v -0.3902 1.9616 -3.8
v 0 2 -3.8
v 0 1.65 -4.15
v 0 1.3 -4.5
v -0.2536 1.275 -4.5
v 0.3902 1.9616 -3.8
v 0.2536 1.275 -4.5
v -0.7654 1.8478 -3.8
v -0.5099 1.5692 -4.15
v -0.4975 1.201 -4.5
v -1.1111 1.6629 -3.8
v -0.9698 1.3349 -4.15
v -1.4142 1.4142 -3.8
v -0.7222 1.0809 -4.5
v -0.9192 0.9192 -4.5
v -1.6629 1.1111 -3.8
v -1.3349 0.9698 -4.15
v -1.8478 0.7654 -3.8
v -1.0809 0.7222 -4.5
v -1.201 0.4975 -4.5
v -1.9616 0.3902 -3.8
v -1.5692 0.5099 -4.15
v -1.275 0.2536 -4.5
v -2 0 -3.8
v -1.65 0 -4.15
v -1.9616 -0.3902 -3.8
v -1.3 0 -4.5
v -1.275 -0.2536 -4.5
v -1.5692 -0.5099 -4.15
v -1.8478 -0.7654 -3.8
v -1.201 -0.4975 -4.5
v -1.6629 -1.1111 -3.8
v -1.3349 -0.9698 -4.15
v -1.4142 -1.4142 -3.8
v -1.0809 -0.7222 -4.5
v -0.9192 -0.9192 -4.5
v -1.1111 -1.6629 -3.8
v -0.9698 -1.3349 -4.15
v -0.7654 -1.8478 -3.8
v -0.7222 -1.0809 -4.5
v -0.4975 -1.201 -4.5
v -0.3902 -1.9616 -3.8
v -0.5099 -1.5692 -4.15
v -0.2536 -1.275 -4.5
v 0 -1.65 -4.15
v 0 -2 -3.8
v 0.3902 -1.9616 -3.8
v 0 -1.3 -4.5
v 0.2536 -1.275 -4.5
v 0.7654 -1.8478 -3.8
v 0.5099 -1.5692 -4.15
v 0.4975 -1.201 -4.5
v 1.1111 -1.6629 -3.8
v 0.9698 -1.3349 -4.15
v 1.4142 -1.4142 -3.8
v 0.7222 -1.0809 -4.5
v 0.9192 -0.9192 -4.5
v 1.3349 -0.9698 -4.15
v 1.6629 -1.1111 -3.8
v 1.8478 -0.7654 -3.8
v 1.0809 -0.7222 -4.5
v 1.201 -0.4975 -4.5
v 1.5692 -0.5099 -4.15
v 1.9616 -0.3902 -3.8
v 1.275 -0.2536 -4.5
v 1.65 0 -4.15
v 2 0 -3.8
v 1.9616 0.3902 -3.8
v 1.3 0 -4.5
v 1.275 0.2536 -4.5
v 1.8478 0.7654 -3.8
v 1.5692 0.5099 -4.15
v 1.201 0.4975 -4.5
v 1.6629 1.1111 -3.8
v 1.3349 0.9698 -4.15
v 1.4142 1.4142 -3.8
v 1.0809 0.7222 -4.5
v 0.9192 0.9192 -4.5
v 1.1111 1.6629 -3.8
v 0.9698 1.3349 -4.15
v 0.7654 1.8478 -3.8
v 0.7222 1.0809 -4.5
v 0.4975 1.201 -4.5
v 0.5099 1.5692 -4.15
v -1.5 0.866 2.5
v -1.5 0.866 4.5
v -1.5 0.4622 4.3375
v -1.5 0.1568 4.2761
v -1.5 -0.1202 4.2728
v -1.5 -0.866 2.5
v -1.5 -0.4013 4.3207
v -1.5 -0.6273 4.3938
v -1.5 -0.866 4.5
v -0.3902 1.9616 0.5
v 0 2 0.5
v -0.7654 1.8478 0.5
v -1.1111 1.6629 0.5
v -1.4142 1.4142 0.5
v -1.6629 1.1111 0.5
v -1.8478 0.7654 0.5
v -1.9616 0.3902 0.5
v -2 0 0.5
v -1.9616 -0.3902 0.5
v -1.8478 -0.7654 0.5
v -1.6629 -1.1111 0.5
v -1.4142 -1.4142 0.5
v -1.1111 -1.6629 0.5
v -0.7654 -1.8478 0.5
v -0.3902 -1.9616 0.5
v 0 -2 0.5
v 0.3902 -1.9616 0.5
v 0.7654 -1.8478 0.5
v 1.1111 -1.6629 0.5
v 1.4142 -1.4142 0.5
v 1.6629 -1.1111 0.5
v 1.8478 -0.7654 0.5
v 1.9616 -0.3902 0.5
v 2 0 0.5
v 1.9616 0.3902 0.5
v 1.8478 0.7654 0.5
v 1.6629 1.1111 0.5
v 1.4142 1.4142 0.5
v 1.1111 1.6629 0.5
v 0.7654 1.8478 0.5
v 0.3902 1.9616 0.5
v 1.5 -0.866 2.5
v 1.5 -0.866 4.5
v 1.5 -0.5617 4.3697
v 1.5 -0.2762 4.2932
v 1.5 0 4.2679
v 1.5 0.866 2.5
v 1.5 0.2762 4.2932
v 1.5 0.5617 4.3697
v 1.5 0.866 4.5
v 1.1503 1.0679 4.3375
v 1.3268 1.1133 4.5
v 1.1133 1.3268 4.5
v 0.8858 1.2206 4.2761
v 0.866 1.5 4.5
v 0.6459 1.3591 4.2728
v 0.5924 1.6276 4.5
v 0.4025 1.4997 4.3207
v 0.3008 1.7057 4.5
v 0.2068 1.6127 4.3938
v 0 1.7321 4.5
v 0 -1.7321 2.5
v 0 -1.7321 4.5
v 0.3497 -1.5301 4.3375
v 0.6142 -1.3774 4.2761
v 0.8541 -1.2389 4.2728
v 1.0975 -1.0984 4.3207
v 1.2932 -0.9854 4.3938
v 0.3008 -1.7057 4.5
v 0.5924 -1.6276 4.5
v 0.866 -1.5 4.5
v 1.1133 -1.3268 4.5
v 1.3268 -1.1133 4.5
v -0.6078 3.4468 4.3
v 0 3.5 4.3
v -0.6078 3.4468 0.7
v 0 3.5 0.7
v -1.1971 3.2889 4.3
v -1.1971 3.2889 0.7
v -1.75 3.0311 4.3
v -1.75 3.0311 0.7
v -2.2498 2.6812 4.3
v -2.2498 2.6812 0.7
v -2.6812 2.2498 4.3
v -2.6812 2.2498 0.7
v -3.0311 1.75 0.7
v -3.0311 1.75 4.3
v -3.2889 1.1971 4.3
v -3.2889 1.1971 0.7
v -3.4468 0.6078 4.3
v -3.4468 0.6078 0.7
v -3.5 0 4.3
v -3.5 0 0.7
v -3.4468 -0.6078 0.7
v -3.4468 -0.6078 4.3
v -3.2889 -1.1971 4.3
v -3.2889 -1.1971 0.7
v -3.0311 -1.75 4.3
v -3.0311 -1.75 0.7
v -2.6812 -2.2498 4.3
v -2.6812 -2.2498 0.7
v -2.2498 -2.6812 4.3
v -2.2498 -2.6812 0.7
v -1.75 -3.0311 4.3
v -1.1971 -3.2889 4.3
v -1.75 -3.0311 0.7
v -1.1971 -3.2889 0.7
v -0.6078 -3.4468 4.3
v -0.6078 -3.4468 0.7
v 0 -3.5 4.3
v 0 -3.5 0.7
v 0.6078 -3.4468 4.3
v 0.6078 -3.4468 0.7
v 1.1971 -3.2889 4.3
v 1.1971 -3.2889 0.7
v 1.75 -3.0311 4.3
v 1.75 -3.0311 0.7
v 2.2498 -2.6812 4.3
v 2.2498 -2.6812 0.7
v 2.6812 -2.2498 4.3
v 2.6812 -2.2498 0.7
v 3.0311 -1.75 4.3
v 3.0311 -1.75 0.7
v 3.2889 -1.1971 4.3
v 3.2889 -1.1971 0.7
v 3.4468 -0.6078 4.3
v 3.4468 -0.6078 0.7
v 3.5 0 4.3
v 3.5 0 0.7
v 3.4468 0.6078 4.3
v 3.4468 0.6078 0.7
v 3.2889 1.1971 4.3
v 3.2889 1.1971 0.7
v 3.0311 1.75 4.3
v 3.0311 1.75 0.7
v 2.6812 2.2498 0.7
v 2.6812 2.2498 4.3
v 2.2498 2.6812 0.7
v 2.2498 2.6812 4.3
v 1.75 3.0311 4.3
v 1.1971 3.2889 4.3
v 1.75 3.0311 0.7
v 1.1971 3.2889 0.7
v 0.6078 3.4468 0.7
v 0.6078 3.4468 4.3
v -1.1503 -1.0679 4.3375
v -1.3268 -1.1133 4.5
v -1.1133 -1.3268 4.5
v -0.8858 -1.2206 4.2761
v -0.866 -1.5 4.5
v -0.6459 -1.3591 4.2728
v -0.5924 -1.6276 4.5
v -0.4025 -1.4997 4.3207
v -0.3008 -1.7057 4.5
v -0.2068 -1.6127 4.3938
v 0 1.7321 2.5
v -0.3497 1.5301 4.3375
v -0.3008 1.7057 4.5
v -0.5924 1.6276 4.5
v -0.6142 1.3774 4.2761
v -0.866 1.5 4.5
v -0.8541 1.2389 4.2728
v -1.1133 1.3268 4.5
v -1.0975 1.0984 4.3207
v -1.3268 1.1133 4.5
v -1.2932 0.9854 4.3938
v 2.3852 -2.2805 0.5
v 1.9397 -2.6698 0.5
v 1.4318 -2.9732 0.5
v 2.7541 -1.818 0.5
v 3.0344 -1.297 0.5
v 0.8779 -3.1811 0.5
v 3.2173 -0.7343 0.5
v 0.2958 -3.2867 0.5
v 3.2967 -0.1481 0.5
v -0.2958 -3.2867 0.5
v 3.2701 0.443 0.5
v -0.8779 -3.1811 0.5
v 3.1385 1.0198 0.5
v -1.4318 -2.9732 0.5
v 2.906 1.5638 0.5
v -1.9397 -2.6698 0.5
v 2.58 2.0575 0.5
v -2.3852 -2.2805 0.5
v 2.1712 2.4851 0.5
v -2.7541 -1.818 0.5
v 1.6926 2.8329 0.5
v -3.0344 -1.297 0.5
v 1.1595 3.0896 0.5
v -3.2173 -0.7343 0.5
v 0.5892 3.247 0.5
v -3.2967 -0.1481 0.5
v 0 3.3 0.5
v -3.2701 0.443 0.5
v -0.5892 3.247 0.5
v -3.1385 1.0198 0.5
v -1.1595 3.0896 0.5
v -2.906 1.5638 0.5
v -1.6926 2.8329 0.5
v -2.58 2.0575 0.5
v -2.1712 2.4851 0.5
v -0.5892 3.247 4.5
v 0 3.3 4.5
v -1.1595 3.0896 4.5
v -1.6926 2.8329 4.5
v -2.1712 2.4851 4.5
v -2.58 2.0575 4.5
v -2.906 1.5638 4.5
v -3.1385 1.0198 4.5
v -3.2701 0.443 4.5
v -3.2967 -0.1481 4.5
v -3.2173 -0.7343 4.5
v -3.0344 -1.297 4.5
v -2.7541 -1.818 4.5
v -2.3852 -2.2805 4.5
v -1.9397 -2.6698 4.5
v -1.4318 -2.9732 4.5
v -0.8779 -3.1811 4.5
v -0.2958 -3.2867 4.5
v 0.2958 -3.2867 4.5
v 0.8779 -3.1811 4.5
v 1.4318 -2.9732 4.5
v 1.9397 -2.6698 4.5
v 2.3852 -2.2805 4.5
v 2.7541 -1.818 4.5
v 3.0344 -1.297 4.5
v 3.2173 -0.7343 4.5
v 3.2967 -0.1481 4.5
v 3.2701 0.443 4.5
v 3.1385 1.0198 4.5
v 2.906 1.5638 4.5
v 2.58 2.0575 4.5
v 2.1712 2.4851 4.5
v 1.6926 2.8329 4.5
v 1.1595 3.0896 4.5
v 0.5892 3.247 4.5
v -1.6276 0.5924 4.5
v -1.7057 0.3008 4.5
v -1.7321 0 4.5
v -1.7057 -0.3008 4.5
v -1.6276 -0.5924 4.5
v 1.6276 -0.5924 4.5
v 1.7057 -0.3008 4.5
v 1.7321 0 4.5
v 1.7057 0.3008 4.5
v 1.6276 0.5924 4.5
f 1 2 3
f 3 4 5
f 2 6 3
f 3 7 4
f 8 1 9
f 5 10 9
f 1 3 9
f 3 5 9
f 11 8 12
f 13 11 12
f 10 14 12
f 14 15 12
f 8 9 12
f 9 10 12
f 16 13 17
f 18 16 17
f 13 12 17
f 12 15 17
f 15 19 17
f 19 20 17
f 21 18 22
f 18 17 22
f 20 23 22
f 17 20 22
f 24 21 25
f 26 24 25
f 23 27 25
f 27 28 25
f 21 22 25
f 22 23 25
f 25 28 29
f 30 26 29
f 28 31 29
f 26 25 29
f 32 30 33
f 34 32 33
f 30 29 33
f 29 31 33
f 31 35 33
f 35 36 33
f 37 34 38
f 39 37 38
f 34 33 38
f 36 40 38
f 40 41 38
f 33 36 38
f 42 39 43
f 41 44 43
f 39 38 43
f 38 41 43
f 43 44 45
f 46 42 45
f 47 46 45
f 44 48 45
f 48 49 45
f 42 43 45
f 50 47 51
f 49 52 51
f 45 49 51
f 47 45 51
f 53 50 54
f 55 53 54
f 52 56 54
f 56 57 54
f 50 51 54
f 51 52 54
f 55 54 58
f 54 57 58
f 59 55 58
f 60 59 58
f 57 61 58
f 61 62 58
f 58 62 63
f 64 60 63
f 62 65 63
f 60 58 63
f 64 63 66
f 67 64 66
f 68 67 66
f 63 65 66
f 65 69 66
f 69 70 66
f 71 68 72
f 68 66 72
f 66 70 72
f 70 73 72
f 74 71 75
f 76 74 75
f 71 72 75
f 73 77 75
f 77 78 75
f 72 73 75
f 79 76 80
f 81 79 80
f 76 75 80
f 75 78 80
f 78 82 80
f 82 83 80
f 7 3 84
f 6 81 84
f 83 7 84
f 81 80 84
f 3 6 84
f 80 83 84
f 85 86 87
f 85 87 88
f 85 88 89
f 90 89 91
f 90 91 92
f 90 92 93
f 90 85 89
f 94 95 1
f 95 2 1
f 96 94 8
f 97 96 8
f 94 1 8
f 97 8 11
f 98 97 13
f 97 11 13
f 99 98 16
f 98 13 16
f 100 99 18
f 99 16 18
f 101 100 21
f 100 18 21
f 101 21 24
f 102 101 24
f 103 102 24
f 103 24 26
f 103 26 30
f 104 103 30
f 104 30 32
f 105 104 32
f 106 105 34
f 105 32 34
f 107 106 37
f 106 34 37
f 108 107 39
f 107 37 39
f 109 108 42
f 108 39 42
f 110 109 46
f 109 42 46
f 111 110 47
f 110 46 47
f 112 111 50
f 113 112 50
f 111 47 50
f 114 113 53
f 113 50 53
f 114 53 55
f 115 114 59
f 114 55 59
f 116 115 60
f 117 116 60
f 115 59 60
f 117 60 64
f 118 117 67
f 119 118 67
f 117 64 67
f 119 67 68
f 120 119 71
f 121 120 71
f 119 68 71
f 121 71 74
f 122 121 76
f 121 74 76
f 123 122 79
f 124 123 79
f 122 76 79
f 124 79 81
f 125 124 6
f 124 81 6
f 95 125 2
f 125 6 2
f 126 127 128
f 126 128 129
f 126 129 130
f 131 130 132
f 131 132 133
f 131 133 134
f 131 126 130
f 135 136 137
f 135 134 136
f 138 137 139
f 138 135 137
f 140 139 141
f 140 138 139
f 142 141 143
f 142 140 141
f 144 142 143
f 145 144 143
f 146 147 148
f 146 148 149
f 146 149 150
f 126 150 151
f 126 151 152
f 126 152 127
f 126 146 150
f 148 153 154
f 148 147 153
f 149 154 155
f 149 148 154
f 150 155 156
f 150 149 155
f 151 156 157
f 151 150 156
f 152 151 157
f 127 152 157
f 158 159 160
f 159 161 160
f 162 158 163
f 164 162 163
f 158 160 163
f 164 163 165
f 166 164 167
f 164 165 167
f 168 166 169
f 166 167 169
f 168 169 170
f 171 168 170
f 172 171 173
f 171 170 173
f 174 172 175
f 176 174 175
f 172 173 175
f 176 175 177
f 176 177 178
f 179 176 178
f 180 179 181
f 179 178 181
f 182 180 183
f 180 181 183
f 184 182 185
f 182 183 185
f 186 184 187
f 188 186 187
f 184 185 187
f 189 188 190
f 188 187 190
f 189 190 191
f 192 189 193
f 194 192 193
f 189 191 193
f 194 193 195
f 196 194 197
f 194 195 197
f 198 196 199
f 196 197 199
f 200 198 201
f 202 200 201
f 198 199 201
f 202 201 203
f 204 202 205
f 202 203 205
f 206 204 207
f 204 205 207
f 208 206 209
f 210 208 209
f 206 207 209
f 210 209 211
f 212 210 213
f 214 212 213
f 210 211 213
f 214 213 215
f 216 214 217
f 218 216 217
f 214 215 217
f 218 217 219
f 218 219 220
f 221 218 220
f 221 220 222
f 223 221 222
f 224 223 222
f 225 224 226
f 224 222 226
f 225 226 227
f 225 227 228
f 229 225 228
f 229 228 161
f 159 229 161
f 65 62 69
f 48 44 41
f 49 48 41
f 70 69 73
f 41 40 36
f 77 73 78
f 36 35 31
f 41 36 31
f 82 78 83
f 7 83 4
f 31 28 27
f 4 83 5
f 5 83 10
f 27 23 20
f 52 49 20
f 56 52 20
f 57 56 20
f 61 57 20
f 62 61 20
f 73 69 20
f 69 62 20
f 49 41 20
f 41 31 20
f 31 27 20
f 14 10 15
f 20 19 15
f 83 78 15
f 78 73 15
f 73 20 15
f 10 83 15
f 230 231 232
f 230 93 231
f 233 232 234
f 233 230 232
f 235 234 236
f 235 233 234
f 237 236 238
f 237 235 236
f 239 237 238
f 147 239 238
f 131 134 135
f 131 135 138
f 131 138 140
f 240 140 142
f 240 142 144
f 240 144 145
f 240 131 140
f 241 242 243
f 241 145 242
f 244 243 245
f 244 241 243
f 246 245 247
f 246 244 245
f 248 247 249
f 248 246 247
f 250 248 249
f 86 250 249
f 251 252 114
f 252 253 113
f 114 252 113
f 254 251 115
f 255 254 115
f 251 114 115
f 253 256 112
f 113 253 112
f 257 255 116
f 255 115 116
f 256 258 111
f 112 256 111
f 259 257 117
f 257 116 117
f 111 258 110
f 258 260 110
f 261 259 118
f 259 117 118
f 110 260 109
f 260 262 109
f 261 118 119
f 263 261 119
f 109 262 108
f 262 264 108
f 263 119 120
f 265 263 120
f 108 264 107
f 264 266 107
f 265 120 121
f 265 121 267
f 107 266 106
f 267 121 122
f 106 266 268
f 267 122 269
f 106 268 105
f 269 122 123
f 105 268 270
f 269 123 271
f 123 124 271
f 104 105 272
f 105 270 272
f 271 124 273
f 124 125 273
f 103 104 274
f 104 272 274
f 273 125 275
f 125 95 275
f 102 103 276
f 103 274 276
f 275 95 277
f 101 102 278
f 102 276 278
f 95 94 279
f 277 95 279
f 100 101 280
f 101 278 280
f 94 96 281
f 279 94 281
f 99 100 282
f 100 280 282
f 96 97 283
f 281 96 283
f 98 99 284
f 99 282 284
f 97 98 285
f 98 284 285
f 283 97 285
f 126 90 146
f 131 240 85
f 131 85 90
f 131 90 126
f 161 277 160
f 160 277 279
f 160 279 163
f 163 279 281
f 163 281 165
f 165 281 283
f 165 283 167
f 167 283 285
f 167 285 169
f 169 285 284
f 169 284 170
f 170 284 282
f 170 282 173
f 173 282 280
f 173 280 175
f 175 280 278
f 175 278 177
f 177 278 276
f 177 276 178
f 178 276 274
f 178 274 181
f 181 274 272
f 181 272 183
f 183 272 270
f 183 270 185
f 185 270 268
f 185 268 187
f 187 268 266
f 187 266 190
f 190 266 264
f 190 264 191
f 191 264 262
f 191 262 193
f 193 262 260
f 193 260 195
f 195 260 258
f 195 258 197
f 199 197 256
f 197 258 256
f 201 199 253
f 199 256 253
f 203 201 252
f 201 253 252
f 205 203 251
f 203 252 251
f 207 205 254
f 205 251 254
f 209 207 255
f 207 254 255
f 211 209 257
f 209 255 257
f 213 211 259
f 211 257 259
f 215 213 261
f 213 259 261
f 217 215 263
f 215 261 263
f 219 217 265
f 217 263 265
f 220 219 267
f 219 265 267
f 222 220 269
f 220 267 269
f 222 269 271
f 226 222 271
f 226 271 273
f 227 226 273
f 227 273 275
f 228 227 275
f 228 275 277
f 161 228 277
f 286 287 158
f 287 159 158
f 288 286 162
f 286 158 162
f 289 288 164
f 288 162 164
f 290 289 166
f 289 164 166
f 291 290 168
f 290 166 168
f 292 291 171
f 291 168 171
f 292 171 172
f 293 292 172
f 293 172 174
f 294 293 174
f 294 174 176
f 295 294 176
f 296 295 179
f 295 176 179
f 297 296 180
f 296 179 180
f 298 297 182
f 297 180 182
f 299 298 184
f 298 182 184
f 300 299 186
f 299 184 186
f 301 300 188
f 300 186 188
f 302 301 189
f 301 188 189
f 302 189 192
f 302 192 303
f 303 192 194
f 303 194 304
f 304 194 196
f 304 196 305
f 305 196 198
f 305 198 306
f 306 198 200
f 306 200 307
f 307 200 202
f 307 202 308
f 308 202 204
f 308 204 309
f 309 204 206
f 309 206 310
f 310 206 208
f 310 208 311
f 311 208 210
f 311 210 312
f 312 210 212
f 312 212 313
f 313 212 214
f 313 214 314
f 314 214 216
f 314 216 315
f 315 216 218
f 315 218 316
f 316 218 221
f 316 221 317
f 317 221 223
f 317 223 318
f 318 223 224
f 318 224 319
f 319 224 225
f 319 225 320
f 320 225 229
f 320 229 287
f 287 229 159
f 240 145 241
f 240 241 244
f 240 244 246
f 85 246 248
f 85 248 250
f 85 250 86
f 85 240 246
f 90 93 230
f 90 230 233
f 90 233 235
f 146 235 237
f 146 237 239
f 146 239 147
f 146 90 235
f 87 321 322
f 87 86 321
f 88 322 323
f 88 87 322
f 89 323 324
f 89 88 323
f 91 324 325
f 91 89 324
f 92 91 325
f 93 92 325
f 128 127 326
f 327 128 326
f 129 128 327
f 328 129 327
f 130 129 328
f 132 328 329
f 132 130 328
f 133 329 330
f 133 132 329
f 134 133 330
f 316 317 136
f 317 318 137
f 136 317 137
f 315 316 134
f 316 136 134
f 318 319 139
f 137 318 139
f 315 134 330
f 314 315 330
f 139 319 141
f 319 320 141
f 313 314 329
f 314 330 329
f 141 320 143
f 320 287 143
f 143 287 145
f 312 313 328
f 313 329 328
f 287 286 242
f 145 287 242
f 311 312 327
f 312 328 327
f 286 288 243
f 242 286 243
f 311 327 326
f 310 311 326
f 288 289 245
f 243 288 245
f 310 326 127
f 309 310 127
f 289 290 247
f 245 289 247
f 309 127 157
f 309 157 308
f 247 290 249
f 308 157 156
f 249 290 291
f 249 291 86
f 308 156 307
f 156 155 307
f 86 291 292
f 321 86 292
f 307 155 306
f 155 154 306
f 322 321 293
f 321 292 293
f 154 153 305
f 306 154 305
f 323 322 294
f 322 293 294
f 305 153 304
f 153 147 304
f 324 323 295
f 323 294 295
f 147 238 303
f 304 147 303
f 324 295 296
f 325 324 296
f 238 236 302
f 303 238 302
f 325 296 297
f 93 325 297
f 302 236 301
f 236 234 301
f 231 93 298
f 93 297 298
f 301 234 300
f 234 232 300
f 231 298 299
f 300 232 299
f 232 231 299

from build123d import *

# Parameters (mm, degrees)
CUT_EXTRUDE1_START = -2
CUT_EXTRUDE1_DEPTH = 2
SKETCH4_R          = 1.732050808
CUT_EXTRUDE2_DEPTH = 0.5
CUT_EXTRUDE2_TAPER = 45


with BuildPart() as part:
    # Sketch2 → Revolve1 (revolve)
    with BuildSketch(Plane(origin=(0, 0, 0), x_dir=(0, 0, -1), z_dir=(1, 0, 0))):
        Polygon((-4.3, 3.5), (-0.7, 3.5), (-0.5, 3.3), (-0.5, 2), (3.8, 2), (4.5, 1.3), (4.5, 0), (-4.5, 0), (-4.5, 3.3), align=None)
    revolve(axis=Axis((0, 0, -4.5), (0, 0, 1)))

    # Sketch3 → Cut-Extrude1 (cut)
    with BuildSketch(Plane.XY.offset(4.5).offset(CUT_EXTRUDE1_START)):
        Polygon((0, 1.732050808), (-1.5, 0.866025404), (-1.5, -0.866025404), (0, -1.732050808), (1.5, -0.866025404), (1.5, 0.866025404), align=None)
    extrude(amount=CUT_EXTRUDE1_DEPTH, mode=Mode.SUBTRACT)

    # Sketch4 → Cut-Extrude2 (cut)
    with BuildSketch(Plane.XY.offset(4.5)):
        Circle(SKETCH4_R)
    extrude(amount=-CUT_EXTRUDE2_DEPTH, taper=CUT_EXTRUDE2_TAPER, mode=Mode.SUBTRACT)


solid = part.part
